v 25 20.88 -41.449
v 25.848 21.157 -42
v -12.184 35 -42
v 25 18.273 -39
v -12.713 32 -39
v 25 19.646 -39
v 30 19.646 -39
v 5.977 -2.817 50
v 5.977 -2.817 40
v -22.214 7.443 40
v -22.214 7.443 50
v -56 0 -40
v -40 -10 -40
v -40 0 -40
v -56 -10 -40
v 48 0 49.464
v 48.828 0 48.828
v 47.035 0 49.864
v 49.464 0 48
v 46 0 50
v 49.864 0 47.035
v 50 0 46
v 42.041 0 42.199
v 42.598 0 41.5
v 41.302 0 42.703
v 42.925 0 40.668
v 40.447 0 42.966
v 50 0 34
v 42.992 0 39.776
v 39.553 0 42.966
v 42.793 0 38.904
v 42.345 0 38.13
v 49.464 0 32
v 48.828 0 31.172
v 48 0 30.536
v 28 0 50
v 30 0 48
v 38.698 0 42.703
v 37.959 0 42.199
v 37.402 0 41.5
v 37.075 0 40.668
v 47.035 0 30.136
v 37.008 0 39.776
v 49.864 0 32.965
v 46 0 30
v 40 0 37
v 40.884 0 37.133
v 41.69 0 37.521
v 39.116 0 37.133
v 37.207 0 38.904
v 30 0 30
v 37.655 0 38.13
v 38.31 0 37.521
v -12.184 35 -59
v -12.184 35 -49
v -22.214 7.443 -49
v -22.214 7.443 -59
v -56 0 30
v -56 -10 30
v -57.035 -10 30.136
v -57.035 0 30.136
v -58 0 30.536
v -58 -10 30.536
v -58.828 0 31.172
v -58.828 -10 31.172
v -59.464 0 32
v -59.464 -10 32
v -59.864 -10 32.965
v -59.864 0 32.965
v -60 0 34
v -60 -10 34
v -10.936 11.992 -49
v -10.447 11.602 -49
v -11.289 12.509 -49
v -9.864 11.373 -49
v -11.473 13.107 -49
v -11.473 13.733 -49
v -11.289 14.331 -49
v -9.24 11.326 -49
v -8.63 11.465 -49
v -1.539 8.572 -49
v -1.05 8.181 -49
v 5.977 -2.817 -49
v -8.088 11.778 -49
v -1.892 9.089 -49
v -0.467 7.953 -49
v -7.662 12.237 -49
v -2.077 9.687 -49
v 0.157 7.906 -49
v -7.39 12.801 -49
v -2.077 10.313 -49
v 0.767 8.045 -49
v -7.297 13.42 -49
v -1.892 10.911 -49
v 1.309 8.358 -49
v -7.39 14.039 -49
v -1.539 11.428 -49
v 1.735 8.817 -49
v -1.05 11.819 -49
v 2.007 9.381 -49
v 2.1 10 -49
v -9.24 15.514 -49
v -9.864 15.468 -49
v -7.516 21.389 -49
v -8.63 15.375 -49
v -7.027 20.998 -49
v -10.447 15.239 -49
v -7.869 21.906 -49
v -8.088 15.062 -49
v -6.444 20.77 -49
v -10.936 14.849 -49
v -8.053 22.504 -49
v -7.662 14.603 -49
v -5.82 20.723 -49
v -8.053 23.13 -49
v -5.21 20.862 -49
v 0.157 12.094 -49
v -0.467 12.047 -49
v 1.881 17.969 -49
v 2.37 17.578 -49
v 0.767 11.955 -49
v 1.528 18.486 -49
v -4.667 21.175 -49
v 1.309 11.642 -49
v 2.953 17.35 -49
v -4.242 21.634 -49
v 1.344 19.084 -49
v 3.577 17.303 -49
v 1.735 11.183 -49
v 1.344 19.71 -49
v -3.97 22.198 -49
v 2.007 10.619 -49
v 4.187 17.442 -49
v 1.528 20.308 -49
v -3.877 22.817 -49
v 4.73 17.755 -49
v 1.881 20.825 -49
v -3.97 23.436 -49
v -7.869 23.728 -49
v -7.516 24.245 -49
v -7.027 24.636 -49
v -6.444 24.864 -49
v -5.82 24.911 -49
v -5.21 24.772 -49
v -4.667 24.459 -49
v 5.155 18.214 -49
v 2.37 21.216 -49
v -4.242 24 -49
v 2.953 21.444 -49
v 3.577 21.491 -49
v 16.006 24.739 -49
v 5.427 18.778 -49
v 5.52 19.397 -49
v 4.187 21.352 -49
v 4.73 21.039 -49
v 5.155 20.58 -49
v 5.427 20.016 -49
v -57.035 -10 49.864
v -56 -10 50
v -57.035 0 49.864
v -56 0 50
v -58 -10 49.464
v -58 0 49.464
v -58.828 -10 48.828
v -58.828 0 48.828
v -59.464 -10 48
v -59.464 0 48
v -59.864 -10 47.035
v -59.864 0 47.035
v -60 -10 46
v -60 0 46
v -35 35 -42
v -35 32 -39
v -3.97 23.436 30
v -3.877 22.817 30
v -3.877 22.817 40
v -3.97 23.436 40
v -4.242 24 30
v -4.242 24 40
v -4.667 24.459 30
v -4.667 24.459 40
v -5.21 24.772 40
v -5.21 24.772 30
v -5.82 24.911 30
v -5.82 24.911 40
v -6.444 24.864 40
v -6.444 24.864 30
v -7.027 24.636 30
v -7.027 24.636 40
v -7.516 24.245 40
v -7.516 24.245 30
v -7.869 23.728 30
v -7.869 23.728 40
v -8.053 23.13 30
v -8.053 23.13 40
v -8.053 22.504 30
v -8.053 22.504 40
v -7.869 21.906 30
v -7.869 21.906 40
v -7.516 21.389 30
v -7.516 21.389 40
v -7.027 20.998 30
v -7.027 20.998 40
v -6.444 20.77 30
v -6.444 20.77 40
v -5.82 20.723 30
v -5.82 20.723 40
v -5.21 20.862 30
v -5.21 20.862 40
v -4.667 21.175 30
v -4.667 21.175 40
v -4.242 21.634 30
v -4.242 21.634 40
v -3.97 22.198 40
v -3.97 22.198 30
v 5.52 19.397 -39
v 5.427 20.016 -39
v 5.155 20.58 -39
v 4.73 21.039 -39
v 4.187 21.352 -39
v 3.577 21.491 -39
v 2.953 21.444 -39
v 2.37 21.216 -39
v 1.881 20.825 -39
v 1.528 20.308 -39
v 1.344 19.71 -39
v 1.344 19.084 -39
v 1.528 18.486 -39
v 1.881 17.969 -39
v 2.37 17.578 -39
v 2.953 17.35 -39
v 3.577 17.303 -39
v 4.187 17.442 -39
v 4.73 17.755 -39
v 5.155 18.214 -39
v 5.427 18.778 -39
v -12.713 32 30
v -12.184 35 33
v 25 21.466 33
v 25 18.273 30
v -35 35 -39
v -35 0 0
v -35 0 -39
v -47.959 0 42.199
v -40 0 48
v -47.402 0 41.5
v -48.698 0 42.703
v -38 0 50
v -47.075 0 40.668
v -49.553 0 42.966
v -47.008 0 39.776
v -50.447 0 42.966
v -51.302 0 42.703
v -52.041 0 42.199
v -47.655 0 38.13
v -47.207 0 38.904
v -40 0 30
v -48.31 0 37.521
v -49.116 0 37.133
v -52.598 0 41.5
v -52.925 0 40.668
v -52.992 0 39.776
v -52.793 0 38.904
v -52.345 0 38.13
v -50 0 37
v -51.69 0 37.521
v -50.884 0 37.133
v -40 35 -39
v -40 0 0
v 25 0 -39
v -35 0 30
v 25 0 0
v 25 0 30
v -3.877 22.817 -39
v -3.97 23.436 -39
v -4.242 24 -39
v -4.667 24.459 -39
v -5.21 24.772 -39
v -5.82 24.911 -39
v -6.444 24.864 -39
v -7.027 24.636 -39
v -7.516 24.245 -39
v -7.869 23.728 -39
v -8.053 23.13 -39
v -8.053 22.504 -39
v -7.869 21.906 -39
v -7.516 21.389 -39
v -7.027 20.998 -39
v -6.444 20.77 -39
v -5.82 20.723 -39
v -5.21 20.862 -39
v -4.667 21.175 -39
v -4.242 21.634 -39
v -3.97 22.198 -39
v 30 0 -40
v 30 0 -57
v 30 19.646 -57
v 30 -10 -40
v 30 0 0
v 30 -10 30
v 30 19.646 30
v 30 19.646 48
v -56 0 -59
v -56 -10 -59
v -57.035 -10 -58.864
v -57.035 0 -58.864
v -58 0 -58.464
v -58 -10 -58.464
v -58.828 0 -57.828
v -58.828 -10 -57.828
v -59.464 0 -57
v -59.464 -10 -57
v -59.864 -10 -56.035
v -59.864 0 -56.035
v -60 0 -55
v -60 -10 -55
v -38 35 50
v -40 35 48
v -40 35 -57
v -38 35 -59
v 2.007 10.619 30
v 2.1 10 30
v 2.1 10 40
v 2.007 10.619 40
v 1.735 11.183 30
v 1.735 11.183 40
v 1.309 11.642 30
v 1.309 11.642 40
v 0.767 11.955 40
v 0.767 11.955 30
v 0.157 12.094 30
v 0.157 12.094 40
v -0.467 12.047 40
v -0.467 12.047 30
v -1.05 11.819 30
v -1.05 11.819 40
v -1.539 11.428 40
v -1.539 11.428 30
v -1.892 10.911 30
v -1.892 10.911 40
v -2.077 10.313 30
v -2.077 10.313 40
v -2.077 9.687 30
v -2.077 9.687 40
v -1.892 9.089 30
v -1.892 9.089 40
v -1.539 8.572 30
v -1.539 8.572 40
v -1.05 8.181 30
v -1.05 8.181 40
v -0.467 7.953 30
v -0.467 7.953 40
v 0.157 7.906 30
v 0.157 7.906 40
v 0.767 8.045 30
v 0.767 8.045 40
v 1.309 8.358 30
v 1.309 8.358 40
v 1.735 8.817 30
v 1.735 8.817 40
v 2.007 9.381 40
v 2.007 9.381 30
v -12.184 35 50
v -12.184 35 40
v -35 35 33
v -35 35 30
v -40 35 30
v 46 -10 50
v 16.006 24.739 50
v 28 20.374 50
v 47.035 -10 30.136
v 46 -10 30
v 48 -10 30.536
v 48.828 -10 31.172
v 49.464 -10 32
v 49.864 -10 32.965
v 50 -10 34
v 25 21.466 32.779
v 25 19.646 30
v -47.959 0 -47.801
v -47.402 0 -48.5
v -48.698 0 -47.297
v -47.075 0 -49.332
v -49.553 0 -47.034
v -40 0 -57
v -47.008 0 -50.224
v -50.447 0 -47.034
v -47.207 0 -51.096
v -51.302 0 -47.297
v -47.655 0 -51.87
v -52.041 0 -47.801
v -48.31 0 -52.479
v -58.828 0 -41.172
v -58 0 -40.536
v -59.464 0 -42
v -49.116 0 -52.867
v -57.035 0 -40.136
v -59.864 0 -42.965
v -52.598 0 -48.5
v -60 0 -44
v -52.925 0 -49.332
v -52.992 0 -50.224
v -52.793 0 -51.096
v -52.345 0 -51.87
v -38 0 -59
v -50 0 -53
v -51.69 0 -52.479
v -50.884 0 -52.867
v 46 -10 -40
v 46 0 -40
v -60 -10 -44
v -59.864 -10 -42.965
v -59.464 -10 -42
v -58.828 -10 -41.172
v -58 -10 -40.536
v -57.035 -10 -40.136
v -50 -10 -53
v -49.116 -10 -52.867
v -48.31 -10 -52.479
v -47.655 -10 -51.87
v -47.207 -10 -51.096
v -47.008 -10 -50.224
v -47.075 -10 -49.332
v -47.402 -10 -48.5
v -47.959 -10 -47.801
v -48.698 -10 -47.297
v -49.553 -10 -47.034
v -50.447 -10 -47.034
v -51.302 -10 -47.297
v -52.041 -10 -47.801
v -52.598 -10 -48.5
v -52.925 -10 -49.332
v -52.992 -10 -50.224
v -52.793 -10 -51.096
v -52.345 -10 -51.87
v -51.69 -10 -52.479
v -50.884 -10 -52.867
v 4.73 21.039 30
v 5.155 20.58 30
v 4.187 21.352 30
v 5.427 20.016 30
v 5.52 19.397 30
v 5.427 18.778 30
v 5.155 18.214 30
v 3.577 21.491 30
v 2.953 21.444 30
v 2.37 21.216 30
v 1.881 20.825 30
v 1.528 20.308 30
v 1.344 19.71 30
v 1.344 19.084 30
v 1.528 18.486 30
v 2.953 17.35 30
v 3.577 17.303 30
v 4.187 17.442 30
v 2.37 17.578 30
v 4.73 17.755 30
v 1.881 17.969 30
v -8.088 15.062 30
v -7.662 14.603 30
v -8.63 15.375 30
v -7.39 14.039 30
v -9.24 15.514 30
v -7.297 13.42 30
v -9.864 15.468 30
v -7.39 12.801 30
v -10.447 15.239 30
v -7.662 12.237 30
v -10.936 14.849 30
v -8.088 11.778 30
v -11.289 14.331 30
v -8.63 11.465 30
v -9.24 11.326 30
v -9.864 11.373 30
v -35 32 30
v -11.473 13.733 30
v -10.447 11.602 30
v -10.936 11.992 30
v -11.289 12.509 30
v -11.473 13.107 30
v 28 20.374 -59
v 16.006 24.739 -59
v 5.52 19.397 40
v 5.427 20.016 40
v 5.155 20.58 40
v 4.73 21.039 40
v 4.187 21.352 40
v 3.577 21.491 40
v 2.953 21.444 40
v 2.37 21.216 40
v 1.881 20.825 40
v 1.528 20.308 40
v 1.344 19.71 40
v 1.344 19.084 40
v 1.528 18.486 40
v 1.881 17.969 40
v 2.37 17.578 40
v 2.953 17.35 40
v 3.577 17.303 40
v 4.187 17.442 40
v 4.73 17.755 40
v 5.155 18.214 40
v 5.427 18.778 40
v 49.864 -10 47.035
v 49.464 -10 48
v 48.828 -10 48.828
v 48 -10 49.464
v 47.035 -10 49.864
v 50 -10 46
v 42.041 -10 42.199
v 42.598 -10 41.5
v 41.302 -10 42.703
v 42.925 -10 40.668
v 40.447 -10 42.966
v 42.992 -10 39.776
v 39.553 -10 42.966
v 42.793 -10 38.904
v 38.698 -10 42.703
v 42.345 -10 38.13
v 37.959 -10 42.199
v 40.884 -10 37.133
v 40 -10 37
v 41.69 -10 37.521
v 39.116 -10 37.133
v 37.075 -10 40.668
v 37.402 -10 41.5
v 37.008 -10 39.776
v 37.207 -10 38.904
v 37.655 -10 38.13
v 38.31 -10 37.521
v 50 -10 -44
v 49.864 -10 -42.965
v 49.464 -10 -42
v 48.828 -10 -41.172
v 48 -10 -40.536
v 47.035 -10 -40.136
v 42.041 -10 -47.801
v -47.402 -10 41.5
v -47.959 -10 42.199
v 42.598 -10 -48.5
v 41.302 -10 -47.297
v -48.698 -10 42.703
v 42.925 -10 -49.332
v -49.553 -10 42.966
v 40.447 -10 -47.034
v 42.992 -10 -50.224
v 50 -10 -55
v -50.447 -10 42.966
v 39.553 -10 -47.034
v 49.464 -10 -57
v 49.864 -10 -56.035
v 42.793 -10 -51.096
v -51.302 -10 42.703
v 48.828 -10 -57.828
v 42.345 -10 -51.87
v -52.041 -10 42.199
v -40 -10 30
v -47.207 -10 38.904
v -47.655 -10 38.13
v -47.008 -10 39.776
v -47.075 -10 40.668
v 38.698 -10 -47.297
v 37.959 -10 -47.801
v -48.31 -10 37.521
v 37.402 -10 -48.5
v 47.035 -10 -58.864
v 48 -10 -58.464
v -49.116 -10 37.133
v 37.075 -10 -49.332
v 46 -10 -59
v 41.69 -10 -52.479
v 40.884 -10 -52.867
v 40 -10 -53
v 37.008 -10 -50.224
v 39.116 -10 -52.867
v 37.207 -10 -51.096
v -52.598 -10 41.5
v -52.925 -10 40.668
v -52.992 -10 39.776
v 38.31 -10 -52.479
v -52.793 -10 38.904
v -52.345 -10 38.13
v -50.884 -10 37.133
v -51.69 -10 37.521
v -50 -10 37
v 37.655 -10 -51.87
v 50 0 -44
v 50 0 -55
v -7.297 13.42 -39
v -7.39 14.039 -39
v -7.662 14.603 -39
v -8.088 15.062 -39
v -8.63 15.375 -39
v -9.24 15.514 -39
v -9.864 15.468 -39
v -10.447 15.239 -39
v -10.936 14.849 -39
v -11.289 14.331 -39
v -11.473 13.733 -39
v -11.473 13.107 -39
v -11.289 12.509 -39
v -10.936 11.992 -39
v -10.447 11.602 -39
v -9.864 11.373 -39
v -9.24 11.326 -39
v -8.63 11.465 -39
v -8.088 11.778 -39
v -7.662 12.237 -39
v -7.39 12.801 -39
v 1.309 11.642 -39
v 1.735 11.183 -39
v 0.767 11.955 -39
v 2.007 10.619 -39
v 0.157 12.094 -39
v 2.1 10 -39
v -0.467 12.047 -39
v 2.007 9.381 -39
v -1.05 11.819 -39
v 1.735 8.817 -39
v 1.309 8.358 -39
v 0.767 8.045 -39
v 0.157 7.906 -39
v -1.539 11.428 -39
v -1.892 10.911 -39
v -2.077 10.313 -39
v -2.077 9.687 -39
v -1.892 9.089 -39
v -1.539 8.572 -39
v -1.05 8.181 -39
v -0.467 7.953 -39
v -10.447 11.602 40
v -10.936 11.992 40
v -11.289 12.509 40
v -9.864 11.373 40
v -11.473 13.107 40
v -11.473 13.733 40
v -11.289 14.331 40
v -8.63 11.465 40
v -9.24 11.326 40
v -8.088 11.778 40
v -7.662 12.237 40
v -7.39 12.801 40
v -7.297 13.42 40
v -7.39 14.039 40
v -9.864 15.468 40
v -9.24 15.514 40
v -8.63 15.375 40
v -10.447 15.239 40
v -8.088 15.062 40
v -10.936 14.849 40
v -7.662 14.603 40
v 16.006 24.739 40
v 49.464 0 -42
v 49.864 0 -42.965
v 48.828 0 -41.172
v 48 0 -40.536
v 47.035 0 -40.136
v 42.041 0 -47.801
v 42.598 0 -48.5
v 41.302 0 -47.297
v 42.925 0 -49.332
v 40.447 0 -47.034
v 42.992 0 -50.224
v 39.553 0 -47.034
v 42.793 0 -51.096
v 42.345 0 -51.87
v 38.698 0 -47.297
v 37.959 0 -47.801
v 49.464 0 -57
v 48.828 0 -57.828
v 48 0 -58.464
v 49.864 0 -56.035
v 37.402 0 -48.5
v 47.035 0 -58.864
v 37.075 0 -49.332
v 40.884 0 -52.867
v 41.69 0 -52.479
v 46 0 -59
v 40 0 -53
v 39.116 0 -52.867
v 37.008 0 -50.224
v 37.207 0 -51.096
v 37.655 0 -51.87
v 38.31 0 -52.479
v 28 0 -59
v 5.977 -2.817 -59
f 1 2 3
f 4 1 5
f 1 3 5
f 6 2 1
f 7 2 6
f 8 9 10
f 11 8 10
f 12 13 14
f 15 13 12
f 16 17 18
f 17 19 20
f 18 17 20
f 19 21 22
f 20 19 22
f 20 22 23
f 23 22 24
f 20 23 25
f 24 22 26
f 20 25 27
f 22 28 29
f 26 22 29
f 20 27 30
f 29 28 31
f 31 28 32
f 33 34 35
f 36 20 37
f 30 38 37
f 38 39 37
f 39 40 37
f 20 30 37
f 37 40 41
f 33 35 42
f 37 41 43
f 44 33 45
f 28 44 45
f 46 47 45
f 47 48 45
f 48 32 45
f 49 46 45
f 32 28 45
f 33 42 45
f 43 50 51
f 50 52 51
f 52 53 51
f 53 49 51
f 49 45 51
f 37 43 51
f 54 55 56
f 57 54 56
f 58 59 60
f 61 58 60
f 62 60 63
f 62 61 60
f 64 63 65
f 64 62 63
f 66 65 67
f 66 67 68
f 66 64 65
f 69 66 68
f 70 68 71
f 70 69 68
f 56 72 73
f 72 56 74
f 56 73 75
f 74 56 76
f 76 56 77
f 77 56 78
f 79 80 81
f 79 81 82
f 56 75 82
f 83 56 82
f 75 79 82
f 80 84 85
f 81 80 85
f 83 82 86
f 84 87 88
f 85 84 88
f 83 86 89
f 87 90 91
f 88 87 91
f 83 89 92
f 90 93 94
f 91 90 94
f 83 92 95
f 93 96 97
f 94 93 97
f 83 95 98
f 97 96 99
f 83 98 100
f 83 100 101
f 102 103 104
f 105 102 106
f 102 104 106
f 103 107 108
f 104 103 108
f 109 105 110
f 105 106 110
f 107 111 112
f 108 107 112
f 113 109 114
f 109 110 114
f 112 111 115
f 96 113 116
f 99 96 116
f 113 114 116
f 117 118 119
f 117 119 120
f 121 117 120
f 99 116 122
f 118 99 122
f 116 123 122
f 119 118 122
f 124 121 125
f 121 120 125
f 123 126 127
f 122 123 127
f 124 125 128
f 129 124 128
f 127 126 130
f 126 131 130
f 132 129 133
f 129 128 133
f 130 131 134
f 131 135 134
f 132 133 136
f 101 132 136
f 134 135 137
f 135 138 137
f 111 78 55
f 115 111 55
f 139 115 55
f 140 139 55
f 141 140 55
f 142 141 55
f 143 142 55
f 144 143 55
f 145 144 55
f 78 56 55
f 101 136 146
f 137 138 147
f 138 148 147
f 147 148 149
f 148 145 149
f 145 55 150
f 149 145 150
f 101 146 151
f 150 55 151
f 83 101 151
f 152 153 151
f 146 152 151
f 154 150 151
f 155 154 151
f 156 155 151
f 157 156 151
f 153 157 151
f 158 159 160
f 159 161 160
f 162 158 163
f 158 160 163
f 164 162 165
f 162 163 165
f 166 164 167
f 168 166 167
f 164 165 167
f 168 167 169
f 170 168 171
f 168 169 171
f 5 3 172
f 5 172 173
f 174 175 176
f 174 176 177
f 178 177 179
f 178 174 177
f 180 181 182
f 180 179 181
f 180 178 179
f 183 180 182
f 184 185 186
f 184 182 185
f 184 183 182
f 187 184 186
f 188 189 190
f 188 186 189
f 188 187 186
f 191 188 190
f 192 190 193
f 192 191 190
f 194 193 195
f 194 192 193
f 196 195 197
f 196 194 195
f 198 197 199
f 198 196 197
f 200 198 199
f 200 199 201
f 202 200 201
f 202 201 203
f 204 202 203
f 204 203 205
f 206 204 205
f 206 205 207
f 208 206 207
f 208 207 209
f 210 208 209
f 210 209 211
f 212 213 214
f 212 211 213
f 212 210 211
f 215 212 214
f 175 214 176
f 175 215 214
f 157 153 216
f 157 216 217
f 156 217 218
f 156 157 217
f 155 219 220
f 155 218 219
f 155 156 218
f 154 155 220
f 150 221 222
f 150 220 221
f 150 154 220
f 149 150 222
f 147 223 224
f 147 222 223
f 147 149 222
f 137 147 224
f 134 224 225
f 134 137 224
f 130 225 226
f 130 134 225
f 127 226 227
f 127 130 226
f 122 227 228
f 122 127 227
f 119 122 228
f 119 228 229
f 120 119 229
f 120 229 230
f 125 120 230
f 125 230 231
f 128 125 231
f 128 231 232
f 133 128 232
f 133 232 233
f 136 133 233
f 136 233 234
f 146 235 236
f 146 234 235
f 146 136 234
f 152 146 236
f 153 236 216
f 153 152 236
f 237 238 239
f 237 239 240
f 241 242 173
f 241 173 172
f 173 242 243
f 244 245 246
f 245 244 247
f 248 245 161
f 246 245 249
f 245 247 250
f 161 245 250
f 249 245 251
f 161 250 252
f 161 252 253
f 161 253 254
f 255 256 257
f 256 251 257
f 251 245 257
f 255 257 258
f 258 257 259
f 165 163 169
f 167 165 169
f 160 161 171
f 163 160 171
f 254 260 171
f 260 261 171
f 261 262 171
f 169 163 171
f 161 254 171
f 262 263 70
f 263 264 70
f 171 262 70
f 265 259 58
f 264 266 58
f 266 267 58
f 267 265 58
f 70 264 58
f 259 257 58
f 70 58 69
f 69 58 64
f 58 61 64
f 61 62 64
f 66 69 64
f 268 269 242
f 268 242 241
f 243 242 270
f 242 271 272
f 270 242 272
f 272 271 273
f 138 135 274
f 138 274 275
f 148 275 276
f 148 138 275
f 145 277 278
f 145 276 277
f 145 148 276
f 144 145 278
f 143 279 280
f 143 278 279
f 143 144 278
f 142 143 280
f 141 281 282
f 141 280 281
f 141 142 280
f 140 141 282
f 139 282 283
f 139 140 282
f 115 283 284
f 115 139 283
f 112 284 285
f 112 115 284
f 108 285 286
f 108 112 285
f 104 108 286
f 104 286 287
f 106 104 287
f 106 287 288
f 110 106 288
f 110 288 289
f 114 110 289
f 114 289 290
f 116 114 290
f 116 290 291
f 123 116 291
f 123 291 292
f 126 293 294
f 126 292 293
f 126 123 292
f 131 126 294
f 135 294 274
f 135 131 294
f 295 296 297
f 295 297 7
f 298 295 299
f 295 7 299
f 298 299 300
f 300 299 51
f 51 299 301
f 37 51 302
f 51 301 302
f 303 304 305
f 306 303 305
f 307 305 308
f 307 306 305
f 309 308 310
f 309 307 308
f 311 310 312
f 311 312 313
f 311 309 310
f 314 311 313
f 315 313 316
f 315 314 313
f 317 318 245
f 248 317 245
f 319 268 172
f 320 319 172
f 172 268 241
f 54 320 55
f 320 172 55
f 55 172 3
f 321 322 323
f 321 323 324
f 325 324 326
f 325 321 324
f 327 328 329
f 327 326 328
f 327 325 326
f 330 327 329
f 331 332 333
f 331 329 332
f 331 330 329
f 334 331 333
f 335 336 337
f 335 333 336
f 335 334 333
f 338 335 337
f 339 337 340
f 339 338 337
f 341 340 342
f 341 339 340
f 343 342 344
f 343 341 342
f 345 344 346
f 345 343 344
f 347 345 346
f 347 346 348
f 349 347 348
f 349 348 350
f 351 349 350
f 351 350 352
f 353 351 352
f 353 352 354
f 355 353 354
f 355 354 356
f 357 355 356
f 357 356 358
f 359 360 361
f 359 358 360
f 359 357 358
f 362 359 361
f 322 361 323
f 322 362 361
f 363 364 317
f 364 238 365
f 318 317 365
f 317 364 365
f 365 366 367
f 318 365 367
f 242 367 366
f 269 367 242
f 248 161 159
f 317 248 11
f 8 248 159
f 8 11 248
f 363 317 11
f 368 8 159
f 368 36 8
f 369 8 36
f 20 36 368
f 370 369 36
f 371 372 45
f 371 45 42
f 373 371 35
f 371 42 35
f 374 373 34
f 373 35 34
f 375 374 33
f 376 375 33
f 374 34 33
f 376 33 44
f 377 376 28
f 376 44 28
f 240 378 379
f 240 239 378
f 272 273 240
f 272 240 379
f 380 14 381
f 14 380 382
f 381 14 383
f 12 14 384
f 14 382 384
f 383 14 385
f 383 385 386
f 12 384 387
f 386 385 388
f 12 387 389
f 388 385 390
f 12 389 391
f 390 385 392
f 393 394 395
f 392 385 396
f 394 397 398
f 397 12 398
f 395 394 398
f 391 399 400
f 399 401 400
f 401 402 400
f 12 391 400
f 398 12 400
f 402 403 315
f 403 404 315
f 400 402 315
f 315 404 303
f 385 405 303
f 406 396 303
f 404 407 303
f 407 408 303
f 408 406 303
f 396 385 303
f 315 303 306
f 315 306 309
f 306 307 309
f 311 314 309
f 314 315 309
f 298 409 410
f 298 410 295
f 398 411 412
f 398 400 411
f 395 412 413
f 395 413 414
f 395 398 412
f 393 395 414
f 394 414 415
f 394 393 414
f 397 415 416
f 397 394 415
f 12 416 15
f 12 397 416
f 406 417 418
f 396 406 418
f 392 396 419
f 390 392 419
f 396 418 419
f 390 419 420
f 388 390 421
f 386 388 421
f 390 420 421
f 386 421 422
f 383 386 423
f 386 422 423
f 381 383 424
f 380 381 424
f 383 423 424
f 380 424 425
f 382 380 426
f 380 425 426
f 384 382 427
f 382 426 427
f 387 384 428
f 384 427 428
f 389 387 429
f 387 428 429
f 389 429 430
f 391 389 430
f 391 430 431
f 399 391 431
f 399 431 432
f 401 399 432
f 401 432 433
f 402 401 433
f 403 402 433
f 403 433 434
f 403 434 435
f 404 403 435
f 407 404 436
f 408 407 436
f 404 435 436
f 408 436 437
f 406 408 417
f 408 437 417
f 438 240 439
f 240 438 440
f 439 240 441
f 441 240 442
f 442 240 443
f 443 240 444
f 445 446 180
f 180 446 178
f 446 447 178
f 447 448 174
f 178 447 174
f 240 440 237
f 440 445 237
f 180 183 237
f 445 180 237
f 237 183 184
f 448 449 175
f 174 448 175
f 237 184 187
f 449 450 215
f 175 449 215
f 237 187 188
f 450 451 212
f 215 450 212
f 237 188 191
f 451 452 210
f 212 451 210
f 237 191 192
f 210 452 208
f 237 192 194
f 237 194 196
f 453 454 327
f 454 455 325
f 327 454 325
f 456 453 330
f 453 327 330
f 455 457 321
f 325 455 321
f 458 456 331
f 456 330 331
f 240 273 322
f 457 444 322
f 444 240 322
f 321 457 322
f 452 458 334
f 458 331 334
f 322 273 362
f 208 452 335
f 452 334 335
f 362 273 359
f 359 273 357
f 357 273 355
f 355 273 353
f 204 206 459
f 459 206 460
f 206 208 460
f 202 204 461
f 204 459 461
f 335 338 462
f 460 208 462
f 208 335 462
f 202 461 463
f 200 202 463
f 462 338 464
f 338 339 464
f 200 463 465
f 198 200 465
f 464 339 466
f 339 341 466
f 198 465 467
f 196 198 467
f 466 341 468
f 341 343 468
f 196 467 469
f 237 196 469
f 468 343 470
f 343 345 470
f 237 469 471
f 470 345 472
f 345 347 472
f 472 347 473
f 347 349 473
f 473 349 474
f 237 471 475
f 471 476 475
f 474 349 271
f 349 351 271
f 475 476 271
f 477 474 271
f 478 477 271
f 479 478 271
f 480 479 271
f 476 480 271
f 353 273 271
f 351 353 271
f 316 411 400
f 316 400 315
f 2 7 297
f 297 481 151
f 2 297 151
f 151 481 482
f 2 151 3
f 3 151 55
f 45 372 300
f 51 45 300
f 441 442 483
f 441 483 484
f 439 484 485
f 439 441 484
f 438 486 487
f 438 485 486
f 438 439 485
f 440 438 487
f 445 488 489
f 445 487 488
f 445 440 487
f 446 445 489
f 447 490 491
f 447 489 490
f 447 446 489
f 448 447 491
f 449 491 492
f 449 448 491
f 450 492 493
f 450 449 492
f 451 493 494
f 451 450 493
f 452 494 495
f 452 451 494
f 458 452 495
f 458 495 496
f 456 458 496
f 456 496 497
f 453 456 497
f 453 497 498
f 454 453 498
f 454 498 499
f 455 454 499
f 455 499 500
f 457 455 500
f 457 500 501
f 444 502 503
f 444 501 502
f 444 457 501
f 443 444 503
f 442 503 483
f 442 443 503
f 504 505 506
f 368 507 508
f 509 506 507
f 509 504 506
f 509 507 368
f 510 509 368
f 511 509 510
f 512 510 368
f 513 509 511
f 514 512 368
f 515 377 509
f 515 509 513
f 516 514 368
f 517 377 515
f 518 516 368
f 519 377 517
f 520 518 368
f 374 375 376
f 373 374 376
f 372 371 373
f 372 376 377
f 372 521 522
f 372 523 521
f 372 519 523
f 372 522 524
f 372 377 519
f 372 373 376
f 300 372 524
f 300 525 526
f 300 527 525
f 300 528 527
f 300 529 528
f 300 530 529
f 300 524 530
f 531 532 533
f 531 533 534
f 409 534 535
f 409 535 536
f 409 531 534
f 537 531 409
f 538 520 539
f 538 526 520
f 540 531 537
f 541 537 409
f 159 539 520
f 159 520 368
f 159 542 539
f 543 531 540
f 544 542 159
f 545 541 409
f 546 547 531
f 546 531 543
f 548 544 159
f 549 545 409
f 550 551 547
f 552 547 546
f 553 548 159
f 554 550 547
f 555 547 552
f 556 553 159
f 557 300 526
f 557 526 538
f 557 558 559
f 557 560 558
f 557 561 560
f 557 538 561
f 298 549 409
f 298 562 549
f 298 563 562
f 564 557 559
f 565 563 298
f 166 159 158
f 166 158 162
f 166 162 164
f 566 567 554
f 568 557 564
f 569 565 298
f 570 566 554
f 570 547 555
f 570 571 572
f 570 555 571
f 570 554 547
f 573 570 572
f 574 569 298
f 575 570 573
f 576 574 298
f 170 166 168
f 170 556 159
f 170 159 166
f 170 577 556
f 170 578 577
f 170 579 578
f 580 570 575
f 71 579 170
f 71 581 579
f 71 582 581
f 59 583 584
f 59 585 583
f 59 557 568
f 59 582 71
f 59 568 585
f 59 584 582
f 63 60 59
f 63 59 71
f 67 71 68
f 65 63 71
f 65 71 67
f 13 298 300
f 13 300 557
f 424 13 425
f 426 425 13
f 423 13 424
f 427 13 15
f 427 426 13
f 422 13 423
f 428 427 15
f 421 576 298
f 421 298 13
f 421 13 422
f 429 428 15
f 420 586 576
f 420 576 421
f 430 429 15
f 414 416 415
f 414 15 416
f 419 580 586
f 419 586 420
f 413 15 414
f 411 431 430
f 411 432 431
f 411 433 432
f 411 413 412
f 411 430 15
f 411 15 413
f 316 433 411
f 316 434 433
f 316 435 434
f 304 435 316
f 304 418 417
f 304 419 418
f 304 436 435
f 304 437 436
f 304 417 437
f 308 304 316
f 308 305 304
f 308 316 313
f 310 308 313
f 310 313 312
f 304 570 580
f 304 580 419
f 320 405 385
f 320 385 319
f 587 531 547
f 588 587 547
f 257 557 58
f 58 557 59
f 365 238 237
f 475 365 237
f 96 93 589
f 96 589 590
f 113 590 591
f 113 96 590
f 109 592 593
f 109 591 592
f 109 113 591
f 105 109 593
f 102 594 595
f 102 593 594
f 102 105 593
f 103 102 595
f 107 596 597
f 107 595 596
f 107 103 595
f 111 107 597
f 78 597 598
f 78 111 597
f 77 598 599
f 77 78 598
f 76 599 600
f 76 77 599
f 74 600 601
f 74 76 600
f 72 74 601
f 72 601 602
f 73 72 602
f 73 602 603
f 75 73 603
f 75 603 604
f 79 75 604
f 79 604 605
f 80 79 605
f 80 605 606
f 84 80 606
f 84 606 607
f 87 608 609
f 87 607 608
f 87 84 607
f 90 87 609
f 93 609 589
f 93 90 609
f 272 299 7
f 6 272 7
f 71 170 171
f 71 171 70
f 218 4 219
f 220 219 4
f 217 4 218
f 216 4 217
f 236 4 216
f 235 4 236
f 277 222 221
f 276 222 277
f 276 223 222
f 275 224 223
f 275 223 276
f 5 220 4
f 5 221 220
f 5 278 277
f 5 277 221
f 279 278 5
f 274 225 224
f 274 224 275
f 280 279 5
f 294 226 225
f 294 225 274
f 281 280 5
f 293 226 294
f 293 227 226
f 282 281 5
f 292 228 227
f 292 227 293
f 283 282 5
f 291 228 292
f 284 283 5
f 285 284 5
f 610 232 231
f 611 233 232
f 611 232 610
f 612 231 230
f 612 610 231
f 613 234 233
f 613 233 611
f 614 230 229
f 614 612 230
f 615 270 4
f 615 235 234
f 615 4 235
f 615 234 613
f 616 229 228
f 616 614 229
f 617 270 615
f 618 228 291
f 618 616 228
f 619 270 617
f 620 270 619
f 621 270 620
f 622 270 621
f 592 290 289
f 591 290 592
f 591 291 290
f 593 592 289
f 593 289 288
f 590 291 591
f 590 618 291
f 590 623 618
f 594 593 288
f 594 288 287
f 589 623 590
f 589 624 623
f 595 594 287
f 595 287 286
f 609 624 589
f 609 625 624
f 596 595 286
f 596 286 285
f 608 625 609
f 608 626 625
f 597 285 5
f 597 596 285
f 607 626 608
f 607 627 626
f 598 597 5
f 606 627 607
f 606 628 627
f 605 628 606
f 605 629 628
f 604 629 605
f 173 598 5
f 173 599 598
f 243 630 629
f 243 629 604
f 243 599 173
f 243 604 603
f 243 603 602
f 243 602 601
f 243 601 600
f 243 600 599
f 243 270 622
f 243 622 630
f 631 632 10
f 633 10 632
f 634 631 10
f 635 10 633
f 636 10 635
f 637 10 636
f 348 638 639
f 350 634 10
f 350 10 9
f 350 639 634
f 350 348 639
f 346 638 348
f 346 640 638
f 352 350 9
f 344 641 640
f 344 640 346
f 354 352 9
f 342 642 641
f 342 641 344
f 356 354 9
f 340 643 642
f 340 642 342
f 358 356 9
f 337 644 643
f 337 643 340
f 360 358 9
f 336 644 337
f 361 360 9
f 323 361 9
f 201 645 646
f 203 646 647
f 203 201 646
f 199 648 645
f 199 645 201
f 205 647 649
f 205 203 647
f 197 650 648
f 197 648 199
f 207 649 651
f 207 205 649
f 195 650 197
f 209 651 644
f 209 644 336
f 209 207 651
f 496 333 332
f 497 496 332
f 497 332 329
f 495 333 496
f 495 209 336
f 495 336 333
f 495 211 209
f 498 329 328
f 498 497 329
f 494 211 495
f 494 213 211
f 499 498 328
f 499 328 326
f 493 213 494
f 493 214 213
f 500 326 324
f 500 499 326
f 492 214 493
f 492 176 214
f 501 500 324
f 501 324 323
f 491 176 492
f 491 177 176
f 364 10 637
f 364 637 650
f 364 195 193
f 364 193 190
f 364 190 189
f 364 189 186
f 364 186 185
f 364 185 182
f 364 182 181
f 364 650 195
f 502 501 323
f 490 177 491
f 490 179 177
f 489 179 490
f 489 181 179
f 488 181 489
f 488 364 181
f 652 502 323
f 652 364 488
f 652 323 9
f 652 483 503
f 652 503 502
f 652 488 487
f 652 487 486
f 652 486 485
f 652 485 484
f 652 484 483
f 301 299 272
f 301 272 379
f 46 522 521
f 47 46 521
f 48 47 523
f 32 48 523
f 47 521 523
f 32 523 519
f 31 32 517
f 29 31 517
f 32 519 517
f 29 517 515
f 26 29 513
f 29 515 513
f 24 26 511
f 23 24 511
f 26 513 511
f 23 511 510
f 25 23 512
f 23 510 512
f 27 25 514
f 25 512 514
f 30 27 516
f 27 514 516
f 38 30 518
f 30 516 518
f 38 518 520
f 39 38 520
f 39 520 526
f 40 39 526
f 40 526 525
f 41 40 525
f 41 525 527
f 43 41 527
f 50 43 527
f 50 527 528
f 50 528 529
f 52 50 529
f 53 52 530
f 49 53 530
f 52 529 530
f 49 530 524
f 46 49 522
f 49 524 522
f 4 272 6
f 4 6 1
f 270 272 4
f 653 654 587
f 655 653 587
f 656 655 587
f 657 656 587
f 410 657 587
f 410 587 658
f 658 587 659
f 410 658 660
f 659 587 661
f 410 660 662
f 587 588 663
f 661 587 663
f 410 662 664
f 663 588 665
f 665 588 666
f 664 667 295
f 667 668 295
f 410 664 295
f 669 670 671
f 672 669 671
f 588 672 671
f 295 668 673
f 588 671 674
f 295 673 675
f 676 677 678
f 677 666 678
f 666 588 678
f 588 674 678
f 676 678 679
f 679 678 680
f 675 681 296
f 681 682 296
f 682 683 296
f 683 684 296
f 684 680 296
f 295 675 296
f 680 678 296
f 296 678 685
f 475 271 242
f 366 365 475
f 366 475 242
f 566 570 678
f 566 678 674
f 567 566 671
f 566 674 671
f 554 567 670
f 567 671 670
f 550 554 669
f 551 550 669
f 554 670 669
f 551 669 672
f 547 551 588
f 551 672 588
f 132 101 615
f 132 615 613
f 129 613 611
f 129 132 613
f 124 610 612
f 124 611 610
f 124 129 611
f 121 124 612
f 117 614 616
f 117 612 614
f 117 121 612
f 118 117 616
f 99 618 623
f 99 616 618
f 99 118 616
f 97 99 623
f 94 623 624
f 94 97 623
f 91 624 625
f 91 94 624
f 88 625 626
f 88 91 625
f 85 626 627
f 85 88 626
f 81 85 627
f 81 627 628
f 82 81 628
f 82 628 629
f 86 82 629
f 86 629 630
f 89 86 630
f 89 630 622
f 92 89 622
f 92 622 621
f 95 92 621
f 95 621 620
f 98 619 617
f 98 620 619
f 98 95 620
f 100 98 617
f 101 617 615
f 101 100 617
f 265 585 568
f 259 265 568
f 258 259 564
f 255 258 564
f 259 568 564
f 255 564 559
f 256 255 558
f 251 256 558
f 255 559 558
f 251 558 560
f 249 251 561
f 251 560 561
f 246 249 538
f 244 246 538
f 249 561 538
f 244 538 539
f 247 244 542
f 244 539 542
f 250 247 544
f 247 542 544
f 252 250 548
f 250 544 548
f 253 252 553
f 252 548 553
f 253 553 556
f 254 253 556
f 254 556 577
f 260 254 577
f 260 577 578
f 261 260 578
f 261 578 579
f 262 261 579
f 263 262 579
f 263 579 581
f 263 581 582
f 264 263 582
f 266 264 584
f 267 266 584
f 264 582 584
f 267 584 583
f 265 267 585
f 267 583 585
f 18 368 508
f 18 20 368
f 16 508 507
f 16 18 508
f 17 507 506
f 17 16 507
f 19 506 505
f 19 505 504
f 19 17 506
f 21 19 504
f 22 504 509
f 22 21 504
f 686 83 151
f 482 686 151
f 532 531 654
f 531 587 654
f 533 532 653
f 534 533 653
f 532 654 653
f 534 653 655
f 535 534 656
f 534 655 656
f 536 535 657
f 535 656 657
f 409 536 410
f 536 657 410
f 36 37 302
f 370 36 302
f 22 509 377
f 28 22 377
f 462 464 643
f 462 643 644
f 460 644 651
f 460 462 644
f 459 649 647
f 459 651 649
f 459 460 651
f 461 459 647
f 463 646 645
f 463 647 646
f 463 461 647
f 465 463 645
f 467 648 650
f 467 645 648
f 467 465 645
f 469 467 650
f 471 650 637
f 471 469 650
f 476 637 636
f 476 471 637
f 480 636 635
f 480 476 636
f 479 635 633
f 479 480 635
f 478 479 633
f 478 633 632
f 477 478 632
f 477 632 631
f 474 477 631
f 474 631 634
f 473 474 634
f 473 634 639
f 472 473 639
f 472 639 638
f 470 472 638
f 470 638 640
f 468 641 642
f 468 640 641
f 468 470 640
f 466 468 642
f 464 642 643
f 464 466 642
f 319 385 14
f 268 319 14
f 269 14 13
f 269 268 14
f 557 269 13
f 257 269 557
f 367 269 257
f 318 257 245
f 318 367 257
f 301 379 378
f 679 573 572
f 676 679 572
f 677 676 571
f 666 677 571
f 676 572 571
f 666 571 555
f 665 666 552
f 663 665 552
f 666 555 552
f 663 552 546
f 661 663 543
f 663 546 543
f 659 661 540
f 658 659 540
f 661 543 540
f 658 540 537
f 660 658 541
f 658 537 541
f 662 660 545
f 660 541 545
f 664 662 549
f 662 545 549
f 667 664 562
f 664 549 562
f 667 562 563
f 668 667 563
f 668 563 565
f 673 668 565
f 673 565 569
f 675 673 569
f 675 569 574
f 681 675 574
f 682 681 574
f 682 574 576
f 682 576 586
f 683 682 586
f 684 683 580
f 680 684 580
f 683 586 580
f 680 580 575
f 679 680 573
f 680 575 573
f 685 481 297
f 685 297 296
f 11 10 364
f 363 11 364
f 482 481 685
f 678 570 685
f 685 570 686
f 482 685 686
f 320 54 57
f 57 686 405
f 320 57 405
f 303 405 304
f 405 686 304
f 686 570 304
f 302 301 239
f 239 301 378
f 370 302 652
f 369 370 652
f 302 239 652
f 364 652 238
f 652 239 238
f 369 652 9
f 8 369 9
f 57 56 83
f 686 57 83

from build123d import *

# Parameters (mm, degrees)
EXTRUDE_1_DEPTH          = 35
EXTRUDE_1_2_DEPTH        = 35
CUT_EXTRUDE_1_DEPTH      = 104.662915259
CUT_EXTRUDE_1_DEPTH_BACK = 104.662915259
SKETCH_2_R               = 2.1
SKETCH_3_W               = 70
SKETCH_3_H               = 10
EXTRUDE_2_DEPTH          = 89
EXTRUDE_3_DEPTH          = 10
EXTRUDE_4_DEPTH          = 10
SKETCH_8_W               = 20
SKETCH_8_H               = 19
SKETCH_8_R               = 3
SKETCH_8_H_2             = 20
EXTRUDE_9_DEPTH          = 10
EXTRUDE_10_DEPTH         = 5
CUT_EXTRUDE_2_DEPTH      = 130.251692445
CUT_EXTRUDE_2_DEPTH_BACK = 130.251692445
EXTRUDE_12_DEPTH         = 5
FILLET_1_R               = 4
FILLET_2_R               = 4
CHAMFER_3_SIZE           = 3
CHAMFER_4_SIZE           = 2


with BuildPart() as part:
    # Эскиз1 → Бобышка-Вытянуть1 (new body)
    with BuildSketch(Plane(origin=(0, 0, 0), x_dir=(1, 0, 0), z_dir=(0, 1, 0))):
        Polygon((0, -40), (30, -40), (30, -30), (-40, -30), (-40, -40), align=None)
    extrude(amount=EXTRUDE_1_DEPTH)


with BuildPart() as body_2:
    # Эскиз1 → Extrude 1 2 (new body)
    with BuildSketch(Plane(origin=(0, 0, 0), x_dir=(1, 0, 0), z_dir=(0, 1, 0))):
        Polygon((0, 49), (30, 49), (30, 39), (-40, 39), (-40, 49), align=None)
    extrude(amount=EXTRUDE_1_2_DEPTH)


with BuildPart() as cut_extrude_1_tool:
    # Эскиз2 → Вырез-Вытянуть1 (new, two sides: drawn at the far end of the back side and taken through both)
    with BuildSketch(Plane.XY.offset(40).offset(-CUT_EXTRUDE_1_DEPTH_BACK)):
        with Locations((0, 10)):
            Circle(SKETCH_2_R)
        with Locations((-9.396926208, 13.420201433)):
            Circle(SKETCH_2_R)
        with Locations((3.420201433, 19.396926208)):
            Circle(SKETCH_2_R)
        with Locations((-5.976724775, 22.817127641)):
            Circle(SKETCH_2_R)
    extrude(amount=CUT_EXTRUDE_1_DEPTH + CUT_EXTRUDE_1_DEPTH_BACK)


with BuildPart() as part_1:
    add(part.part)

    # Вырез-Вытянуть1: cut by cut_extrude_1_tool
    add(cut_extrude_1_tool.part, mode=Mode.SUBTRACT)



with BuildPart() as body_2_1:
    add(body_2.part)

    # Вырез-Вытянуть1: cut by cut_extrude_1_tool
    add(cut_extrude_1_tool.part, mode=Mode.SUBTRACT)


with BuildPart() as part_2:
    add(part_1.part)

    add(body_2_1.part)  # Бобышка-Вытянуть2 merges body 2
    # Эскиз3 → Бобышка-Вытянуть2 (add)
    with BuildSketch(Plane.XY.offset(40)):
        with Locations((-5, -5)):
            Rectangle(SKETCH_3_W, SKETCH_3_H)
    extrude(amount=-EXTRUDE_2_DEPTH)

    # Эскиз4 → Бобышка-Вытянуть3 (add)
    with BuildSketch(Plane.XY.offset(40)):
        Polygon((5.976724775, -2.817127641), (-22.214053849, 7.443476659), (-12.184299593, 35), (-40, 35), (-40, -10), (30, -10), (30, 35), (19.741033581, 35), align=None)
    extrude(amount=EXTRUDE_3_DEPTH)

    # Эскиз5 → Бобышка-Вытянуть4 (add)
    with BuildSketch(Plane(origin=(0, 0, -49), x_dir=(-1, 0, 0), z_dir=(0, 0, -1))):
        Polygon((-30, 35), (-30, -10), (40, -10), (40, 35), (12.184299593, 35), (22.214053849, 7.443476659), (-5.976724775, -2.817127641), (-19.741033581, 35), align=None)
    extrude(amount=EXTRUDE_4_DEPTH)

    # Эскиз8 → Бобышка-Вытянуть9 (add)
    # profile 1 of 4: a face of its own
    with BuildSketch(Plane(origin=(0, -10, 0), x_dir=(-1, 0, 0), z_dir=(0, -1, 0))):
        with Locations((-40, 49.5)):
            Rectangle(SKETCH_8_W, SKETCH_8_H)
        with Locations(Location((-40, 50, 0), (0, 0, 90))):
            Circle(SKETCH_8_R, mode=Mode.SUBTRACT)
    # profile 2 of 4: a face of its own
    with BuildSketch(Plane(origin=(0, -10, 0), x_dir=(-1, 0, 0), z_dir=(0, -1, 0))):
        with Locations((-40, -40)):
            Rectangle(SKETCH_8_W, SKETCH_8_H_2)
        with Locations(Location((-40, -40, 0), (0, 0, 90))):
            Circle(SKETCH_8_R, mode=Mode.SUBTRACT)
    # profile 3 of 4: a face of its own
    with BuildSketch(Plane(origin=(0, -10, 0), x_dir=(-1, 0, 0), z_dir=(0, -1, 0))):
        with Locations((50, 49.5)):
            Rectangle(SKETCH_8_W, SKETCH_8_H)
        with Locations(Location((50, 50, 0), (0, 0, 90))):
            Circle(SKETCH_8_R, mode=Mode.SUBTRACT)
    # profile 4 of 4: a face of its own
    with BuildSketch(Plane(origin=(0, -10, 0), x_dir=(-1, 0, 0), z_dir=(0, -1, 0))):
        with Locations((50, -40)):
            Rectangle(SKETCH_8_W, SKETCH_8_H_2)
        with Locations(Location((50, -40, 0), (0, 0, 90))):
            Circle(SKETCH_8_R, mode=Mode.SUBTRACT)
    extrude(amount=-EXTRUDE_9_DEPTH)

    # Эскиз6 → Бобышка-Вытянуть10 (add)
    with BuildSketch(Plane.ZY.offset(40)):
        Polygon((-39, 0), (0, 0), (-39, 35), align=None)
        Polygon((30, 0), (30, 35), (0, 0), align=None)
    extrude(amount=-EXTRUDE_10_DEPTH)

    # Эскиз10 → Вырез-Вытянуть2 (cut, two sides: drawn at the far end of the back side and taken through both)
    with BuildSketch(Plane.XY.offset(50).offset(-CUT_EXTRUDE_2_DEPTH_BACK)):
        Polygon((30, 19.646170595), (-12.184299593, 35), (30, 35), align=None)
    extrude(amount=CUT_EXTRUDE_2_DEPTH + CUT_EXTRUDE_2_DEPTH_BACK, mode=Mode.SUBTRACT)

    # Эскиз9 → Бобышка-Вытянуть12 (add)
    with BuildSketch(Plane(origin=(30, 0, 0), x_dir=(0, 0, -1), z_dir=(1, 0, 0))):
        Polygon((39, 19.646170595), (39, 0), (0, 0), align=None)
        Polygon((0, 0), (-30, 19.646170595), (-30, 0), align=None)
    extrude(amount=-EXTRUDE_12_DEPTH)

    # Скругление1
    fillet_1_edges = [part_2.edges().sort_by_distance(p)[0] for p in [
        (50, -5, -59),
        (50, -5, 50),
        (-60, -5, -59),
        (-60, -5, 50),
    ]]
    fillet(fillet_1_edges, radius=FILLET_1_R)

    # Скругление2
    fillet_2_edges = [part_2.edges().sort_by_distance(p)[0] for p in [
        (50, -5, -40),
        (50, -5, 30),
        (-60, -5, -40),
        (-60, -5, 30),
    ]]
    fillet(fillet_2_edges, radius=FILLET_2_R)

    # Фаска3
    # the kernel refuses this chamfer: 3 mm, written as the material it takes off along each edge
    with BuildSketch(Plane(origin=(-4.469250629, 35, -39), x_dir=(0, 0.027495876610586768, -0.9996219169112968), z_dir=(-1, 0, 0))) as chamfer_3_piece_1:
        Polygon((CHAMFER_3_SIZE * 0.999621916911, CHAMFER_3_SIZE * 0.0274958766106), (-CHAMFER_3_SIZE * 0.0274958766106, CHAMFER_3_SIZE * 0.999621916911), (0, 0), align=None)
    extrude(amount=30.530749371, mode=Mode.SUBTRACT)
    with BuildSketch(Plane(origin=(-19.434074173, 37.638702152, -39), x_dir=(0.009404143659217951, 0.02583767235300856, -0.9996219169112968), z_dir=(0.9396926207859079, -0.34202014332567027, 0))) as chamfer_3_piece_2_section:
        Polygon((CHAMFER_3_SIZE * 0.999621916911, -CHAMFER_3_SIZE * 0.0274958766106), (-CHAMFER_3_SIZE * 0.0274958766106, -CHAMFER_3_SIZE * 0.999621916911), (0, 0), align=None)
    chamfer_3_piece_2 = extrude(amount=60.321691902, mode=Mode.PRIVATE)
    chamfer_3_piece_2 = split(chamfer_3_piece_2, bisect_by=Plane(origin=(25, 27.771188546, -39.985901666), z_dir=(-1, 0, 0)), keep=Keep.TOP, mode=Mode.PRIVATE)
    add(chamfer_3_piece_2, mode=Mode.SUBTRACT)
    with BuildSketch(Plane(origin=(-19.434074173, 37.638702152, -39), x_dir=(0.009404143659217951, 0.02583767235300856, -0.9996219169112968), z_dir=(0.9396926207859079, -0.34202014332567027, 0))) as chamfer_3_piece_3_section:
        Polygon((CHAMFER_3_SIZE * 0.999621916911, -CHAMFER_3_SIZE * 0.0274958766106), (-CHAMFER_3_SIZE * 0.0274958766106, -CHAMFER_3_SIZE * 0.999621916911), (0, 0), align=None)
    chamfer_3_piece_3 = extrude(amount=60.321691902, mode=Mode.PRIVATE)
    chamfer_3_piece_3 = split(chamfer_3_piece_3, bisect_by=Plane(origin=(26.25970181, 20.183987428, -40.067630782), z_dir=(0, 0.8930842834154016, 0.4498893894241103)), keep=Keep.TOP, mode=Mode.PRIVATE)
    add(chamfer_3_piece_3, mode=Mode.SUBTRACT)
    with BuildSketch(Plane(origin=(-4.469250629, 35, 30), x_dir=(0, 0.027495876610586768, 0.9996219169112968), z_dir=(-1, 0, 0))) as chamfer_3_piece_4:
        Polygon((CHAMFER_3_SIZE * 0.999621916911, -CHAMFER_3_SIZE * 0.0274958766106), (-CHAMFER_3_SIZE * 0.0274958766106, -CHAMFER_3_SIZE * 0.999621916911), (0, 0), align=None)
    extrude(amount=30.530749371, mode=Mode.SUBTRACT)
    with BuildSketch(Plane(origin=(-19.434074173, 37.638702152, 30), x_dir=(0.009404143659217682, 0.025837672353007816, 0.9996219169112968), z_dir=(0.9396926207859079, -0.34202014332567027, 0))) as chamfer_3_piece_5_section:
        Polygon((CHAMFER_3_SIZE * 0.999621916911, CHAMFER_3_SIZE * 0.0274958766106), (-CHAMFER_3_SIZE * 0.0274958766106, CHAMFER_3_SIZE * 0.999621916911), (0, 0), align=None)
    chamfer_3_piece_5 = extrude(amount=60.321691902, mode=Mode.PRIVATE)
    chamfer_3_piece_5 = split(chamfer_3_piece_5, bisect_by=Plane(origin=(25, 27.800984408, 30.984043991), z_dir=(-1, 0, 0)), keep=Keep.TOP, mode=Mode.PRIVATE)
    add(chamfer_3_piece_5, mode=Mode.SUBTRACT)
    with BuildSketch(Plane(origin=(-19.434074173, 37.638702152, 30), x_dir=(0.009404143659217682, 0.025837672353007816, 0.9996219169112968), z_dir=(0.9396926207859079, -0.34202014332567027, 0))) as chamfer_3_piece_6_section:
        Polygon((CHAMFER_3_SIZE * 0.999621916911, CHAMFER_3_SIZE * 0.0274958766106), (-CHAMFER_3_SIZE * 0.0274958766106, CHAMFER_3_SIZE * 0.999621916911), (0, 0), align=None)
    chamfer_3_piece_6 = extrude(amount=60.321691902, mode=Mode.PRIVATE)
    chamfer_3_piece_6 = split(chamfer_3_piece_6, bisect_by=Plane(origin=(26.25, 20.237686054, 30.903253063), z_dir=(0, 0.8365761810170901, -0.547850612261099)), keep=Keep.TOP, mode=Mode.PRIVATE)
    add(chamfer_3_piece_6, mode=Mode.SUBTRACT)

    # Фаска4
    chamfer_4_edges = [part_2.edges().sort_by_distance(p)[0] for p in [
        (30, 9.823085297, 50),
        (-40, 17.5, -59),
        (30, 9.823085297, -59),
        (-40, 17.5, 50),
    ]]
    chamfer(chamfer_4_edges, length=CHAMFER_4_SIZE)


solid = part_2.part
